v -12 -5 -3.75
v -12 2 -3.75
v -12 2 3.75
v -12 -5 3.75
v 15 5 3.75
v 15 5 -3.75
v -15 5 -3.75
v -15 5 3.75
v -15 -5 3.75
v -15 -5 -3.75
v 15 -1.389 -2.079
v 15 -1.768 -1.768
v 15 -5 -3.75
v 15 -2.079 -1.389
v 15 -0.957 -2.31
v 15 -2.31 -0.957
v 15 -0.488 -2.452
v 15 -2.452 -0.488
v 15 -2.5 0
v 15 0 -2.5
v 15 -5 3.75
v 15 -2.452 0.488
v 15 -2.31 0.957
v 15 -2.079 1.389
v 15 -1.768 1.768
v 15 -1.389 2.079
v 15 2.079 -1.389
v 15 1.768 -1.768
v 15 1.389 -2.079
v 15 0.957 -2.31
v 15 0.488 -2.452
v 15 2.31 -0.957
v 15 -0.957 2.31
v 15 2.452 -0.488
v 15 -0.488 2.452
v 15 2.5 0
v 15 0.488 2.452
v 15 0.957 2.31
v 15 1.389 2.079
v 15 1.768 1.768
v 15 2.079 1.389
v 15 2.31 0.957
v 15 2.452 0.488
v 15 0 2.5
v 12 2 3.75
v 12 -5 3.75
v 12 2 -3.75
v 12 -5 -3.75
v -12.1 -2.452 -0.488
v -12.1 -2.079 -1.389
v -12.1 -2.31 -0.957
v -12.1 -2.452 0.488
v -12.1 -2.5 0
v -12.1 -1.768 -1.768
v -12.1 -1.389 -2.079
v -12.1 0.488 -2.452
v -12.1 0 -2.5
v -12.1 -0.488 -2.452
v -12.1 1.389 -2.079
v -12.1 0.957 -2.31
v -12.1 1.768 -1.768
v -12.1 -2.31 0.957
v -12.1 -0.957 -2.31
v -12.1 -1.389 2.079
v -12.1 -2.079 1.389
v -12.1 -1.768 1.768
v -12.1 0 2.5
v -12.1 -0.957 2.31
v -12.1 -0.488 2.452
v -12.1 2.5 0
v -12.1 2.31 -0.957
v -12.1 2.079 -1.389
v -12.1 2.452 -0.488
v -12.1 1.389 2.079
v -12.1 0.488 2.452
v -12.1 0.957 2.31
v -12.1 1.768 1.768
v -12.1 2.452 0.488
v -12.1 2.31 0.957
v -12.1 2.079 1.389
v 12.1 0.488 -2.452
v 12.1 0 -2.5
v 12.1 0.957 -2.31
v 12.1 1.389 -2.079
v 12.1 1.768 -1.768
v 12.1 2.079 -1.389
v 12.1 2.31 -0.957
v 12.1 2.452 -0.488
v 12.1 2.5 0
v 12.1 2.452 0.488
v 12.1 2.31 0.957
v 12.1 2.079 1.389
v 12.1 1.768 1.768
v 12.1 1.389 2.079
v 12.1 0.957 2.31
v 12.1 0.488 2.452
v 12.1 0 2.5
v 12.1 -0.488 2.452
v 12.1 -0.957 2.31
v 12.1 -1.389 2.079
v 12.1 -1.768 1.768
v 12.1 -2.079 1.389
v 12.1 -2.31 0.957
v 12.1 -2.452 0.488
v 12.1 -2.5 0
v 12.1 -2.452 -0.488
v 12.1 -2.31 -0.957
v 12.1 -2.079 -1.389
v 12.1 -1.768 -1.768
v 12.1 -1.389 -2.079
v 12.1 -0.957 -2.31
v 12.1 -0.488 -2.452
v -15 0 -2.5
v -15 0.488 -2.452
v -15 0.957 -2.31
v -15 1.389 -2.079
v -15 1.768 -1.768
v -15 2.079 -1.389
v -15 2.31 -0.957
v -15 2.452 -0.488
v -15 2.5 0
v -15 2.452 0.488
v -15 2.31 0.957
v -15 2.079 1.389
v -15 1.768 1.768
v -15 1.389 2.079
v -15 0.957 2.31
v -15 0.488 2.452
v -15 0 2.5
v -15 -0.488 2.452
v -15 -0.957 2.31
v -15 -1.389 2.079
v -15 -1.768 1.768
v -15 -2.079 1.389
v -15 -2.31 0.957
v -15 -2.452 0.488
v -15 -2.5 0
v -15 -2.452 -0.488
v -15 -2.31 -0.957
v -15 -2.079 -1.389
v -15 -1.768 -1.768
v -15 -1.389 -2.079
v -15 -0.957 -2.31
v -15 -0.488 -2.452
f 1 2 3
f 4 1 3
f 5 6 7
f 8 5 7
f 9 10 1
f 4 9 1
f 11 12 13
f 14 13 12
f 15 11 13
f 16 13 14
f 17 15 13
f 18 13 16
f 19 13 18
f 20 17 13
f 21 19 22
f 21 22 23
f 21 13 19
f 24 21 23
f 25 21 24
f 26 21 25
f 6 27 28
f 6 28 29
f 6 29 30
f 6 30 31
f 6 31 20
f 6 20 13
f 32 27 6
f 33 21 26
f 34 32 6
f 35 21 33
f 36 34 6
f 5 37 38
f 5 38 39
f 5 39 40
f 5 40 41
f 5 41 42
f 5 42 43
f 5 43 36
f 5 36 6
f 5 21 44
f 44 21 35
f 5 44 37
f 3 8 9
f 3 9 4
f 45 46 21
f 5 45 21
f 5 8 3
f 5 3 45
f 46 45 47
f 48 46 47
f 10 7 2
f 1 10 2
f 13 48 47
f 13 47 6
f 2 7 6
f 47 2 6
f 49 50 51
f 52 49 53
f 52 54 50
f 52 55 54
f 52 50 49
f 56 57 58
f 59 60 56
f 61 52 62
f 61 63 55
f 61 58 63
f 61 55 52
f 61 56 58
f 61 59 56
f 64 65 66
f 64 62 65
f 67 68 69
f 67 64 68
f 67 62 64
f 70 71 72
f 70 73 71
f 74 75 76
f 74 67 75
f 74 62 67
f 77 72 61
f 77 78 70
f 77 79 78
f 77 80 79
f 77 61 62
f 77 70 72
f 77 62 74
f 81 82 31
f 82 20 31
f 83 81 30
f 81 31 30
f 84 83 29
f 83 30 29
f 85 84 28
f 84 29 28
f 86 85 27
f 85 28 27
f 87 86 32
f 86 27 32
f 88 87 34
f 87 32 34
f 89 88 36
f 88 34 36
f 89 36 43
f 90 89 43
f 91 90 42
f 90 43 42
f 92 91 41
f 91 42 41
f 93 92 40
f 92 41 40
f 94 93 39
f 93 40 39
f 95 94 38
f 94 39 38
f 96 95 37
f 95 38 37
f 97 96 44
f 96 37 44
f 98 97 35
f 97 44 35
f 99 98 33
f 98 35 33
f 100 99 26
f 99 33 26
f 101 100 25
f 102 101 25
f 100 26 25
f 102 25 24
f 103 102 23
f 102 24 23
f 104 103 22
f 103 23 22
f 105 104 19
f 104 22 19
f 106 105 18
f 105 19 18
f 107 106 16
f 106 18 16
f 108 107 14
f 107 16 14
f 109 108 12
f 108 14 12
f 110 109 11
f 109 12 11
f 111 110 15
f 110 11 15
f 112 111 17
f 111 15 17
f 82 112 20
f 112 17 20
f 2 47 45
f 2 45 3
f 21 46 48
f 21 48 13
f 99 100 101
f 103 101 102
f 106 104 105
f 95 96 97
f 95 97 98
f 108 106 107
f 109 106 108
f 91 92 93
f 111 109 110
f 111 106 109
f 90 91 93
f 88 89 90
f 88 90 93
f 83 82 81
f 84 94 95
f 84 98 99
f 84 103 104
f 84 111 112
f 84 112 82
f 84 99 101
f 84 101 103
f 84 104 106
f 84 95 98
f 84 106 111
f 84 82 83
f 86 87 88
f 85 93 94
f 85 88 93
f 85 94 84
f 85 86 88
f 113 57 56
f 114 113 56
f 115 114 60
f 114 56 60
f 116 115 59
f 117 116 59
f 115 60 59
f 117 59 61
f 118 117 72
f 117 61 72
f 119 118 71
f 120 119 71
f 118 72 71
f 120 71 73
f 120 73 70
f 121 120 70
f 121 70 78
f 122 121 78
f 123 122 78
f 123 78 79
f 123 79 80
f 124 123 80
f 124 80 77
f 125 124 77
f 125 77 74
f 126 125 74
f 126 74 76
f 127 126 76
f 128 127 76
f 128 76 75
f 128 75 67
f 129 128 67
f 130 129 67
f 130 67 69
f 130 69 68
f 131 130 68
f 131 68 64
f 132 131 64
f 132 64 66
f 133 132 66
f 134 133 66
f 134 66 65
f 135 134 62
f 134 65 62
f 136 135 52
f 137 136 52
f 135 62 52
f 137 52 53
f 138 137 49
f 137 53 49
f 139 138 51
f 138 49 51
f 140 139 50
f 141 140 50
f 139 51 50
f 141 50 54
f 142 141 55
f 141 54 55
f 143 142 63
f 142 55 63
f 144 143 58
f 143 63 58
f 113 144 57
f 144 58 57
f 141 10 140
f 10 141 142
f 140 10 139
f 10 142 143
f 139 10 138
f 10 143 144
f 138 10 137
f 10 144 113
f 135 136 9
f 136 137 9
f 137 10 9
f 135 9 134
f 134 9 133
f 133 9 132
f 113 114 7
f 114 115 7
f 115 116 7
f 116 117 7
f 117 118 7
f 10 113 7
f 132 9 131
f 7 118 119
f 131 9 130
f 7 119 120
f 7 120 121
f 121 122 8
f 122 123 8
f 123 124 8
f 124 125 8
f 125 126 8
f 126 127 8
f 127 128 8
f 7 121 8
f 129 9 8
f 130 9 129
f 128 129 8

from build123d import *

# Parameters (mm, degrees)
SKETCH1_W               = 30
SKETCH1_H               = 10
BOSS_EXTRUDE1_DEPTH     = 3.75
CUT_EXTRUDE1_REACH      = 9.5
SKETCH2_W               = 24
SKETCH2_H               = 7
SKETCH4_R               = 2.5
CUT_EXTRUDE2_DEPTH      = 16
CUT_EXTRUDE2_DEPTH_BACK = 16
BOSS_EXTRUDE2_START     = -3
SKETCH5_R               = 2.5
BOSS_EXTRUDE2_DEPTH     = 0.1
BOSS_EXTRUDE3_START     = -3
SKETCH6_R               = 2.5
BOSS_EXTRUDE3_DEPTH     = 0.1
SKETCH7_W               = 24
SKETCH7_H               = 3
BOSS_EXTRUDE4_DEPTH     = 7.5


with BuildPart() as part:
    # Sketch1 → Boss-Extrude1 (new body, symmetric)
    with BuildSketch(Plane.XY):
        Rectangle(SKETCH1_W, SKETCH1_H)
    extrude(amount=BOSS_EXTRUDE1_DEPTH, both=True)

    # Sketch2 → Cut-Extrude1 (cut, up to next)
    with BuildSketch(Plane.XY.offset(3.75), mode=Mode.PRIVATE) as cut_extrude1_sk1:
        with Locations((0, -1.5)):
            Rectangle(SKETCH2_W, SKETCH2_H)
    cut_extrude1_tool1 = extrude(cut_extrude1_sk1.sketch, amount=-CUT_EXTRUDE1_REACH, mode=Mode.PRIVATE) & part.part
    add(cut_extrude1_tool1.solids().sort_by_distance((0, -1.5, 3.75))[0], mode=Mode.SUBTRACT)

    # Sketch4 → Cut-Extrude2 (cut, two sides)
    with BuildSketch(Plane(origin=(0, 0, 0), x_dir=(0, 0, -1), z_dir=(1, 0, 0))) as cut_extrude2_sk:
        Circle(SKETCH4_R)
    extrude(amount=CUT_EXTRUDE2_DEPTH, mode=Mode.SUBTRACT)
    extrude(cut_extrude2_sk.sketch, amount=-CUT_EXTRUDE2_DEPTH_BACK, mode=Mode.SUBTRACT)

    # Sketch5 → Boss-Extrude2 (add)
    with BuildSketch(Plane(origin=(15, 0, 0), x_dir=(0, 0, -1), z_dir=(1, 0, 0)).offset(BOSS_EXTRUDE2_START)):
        Circle(SKETCH5_R)
    extrude(amount=BOSS_EXTRUDE2_DEPTH)

    # Sketch6 → Boss-Extrude3 (add)
    with BuildSketch(Plane.ZY.offset(15).offset(BOSS_EXTRUDE3_START)):
        Circle(SKETCH6_R)
    extrude(amount=BOSS_EXTRUDE3_DEPTH)

    # Sketch7 → Boss-Extrude4 (add)
    with BuildSketch(Plane(origin=(0, 0, -3.75), x_dir=(-1, 0, 0), z_dir=(0, 0, -1))):
        with Locations((0, 3.5)):
            Rectangle(SKETCH7_W, SKETCH7_H)
    extrude(amount=-BOSS_EXTRUDE4_DEPTH)


solid = part.part
